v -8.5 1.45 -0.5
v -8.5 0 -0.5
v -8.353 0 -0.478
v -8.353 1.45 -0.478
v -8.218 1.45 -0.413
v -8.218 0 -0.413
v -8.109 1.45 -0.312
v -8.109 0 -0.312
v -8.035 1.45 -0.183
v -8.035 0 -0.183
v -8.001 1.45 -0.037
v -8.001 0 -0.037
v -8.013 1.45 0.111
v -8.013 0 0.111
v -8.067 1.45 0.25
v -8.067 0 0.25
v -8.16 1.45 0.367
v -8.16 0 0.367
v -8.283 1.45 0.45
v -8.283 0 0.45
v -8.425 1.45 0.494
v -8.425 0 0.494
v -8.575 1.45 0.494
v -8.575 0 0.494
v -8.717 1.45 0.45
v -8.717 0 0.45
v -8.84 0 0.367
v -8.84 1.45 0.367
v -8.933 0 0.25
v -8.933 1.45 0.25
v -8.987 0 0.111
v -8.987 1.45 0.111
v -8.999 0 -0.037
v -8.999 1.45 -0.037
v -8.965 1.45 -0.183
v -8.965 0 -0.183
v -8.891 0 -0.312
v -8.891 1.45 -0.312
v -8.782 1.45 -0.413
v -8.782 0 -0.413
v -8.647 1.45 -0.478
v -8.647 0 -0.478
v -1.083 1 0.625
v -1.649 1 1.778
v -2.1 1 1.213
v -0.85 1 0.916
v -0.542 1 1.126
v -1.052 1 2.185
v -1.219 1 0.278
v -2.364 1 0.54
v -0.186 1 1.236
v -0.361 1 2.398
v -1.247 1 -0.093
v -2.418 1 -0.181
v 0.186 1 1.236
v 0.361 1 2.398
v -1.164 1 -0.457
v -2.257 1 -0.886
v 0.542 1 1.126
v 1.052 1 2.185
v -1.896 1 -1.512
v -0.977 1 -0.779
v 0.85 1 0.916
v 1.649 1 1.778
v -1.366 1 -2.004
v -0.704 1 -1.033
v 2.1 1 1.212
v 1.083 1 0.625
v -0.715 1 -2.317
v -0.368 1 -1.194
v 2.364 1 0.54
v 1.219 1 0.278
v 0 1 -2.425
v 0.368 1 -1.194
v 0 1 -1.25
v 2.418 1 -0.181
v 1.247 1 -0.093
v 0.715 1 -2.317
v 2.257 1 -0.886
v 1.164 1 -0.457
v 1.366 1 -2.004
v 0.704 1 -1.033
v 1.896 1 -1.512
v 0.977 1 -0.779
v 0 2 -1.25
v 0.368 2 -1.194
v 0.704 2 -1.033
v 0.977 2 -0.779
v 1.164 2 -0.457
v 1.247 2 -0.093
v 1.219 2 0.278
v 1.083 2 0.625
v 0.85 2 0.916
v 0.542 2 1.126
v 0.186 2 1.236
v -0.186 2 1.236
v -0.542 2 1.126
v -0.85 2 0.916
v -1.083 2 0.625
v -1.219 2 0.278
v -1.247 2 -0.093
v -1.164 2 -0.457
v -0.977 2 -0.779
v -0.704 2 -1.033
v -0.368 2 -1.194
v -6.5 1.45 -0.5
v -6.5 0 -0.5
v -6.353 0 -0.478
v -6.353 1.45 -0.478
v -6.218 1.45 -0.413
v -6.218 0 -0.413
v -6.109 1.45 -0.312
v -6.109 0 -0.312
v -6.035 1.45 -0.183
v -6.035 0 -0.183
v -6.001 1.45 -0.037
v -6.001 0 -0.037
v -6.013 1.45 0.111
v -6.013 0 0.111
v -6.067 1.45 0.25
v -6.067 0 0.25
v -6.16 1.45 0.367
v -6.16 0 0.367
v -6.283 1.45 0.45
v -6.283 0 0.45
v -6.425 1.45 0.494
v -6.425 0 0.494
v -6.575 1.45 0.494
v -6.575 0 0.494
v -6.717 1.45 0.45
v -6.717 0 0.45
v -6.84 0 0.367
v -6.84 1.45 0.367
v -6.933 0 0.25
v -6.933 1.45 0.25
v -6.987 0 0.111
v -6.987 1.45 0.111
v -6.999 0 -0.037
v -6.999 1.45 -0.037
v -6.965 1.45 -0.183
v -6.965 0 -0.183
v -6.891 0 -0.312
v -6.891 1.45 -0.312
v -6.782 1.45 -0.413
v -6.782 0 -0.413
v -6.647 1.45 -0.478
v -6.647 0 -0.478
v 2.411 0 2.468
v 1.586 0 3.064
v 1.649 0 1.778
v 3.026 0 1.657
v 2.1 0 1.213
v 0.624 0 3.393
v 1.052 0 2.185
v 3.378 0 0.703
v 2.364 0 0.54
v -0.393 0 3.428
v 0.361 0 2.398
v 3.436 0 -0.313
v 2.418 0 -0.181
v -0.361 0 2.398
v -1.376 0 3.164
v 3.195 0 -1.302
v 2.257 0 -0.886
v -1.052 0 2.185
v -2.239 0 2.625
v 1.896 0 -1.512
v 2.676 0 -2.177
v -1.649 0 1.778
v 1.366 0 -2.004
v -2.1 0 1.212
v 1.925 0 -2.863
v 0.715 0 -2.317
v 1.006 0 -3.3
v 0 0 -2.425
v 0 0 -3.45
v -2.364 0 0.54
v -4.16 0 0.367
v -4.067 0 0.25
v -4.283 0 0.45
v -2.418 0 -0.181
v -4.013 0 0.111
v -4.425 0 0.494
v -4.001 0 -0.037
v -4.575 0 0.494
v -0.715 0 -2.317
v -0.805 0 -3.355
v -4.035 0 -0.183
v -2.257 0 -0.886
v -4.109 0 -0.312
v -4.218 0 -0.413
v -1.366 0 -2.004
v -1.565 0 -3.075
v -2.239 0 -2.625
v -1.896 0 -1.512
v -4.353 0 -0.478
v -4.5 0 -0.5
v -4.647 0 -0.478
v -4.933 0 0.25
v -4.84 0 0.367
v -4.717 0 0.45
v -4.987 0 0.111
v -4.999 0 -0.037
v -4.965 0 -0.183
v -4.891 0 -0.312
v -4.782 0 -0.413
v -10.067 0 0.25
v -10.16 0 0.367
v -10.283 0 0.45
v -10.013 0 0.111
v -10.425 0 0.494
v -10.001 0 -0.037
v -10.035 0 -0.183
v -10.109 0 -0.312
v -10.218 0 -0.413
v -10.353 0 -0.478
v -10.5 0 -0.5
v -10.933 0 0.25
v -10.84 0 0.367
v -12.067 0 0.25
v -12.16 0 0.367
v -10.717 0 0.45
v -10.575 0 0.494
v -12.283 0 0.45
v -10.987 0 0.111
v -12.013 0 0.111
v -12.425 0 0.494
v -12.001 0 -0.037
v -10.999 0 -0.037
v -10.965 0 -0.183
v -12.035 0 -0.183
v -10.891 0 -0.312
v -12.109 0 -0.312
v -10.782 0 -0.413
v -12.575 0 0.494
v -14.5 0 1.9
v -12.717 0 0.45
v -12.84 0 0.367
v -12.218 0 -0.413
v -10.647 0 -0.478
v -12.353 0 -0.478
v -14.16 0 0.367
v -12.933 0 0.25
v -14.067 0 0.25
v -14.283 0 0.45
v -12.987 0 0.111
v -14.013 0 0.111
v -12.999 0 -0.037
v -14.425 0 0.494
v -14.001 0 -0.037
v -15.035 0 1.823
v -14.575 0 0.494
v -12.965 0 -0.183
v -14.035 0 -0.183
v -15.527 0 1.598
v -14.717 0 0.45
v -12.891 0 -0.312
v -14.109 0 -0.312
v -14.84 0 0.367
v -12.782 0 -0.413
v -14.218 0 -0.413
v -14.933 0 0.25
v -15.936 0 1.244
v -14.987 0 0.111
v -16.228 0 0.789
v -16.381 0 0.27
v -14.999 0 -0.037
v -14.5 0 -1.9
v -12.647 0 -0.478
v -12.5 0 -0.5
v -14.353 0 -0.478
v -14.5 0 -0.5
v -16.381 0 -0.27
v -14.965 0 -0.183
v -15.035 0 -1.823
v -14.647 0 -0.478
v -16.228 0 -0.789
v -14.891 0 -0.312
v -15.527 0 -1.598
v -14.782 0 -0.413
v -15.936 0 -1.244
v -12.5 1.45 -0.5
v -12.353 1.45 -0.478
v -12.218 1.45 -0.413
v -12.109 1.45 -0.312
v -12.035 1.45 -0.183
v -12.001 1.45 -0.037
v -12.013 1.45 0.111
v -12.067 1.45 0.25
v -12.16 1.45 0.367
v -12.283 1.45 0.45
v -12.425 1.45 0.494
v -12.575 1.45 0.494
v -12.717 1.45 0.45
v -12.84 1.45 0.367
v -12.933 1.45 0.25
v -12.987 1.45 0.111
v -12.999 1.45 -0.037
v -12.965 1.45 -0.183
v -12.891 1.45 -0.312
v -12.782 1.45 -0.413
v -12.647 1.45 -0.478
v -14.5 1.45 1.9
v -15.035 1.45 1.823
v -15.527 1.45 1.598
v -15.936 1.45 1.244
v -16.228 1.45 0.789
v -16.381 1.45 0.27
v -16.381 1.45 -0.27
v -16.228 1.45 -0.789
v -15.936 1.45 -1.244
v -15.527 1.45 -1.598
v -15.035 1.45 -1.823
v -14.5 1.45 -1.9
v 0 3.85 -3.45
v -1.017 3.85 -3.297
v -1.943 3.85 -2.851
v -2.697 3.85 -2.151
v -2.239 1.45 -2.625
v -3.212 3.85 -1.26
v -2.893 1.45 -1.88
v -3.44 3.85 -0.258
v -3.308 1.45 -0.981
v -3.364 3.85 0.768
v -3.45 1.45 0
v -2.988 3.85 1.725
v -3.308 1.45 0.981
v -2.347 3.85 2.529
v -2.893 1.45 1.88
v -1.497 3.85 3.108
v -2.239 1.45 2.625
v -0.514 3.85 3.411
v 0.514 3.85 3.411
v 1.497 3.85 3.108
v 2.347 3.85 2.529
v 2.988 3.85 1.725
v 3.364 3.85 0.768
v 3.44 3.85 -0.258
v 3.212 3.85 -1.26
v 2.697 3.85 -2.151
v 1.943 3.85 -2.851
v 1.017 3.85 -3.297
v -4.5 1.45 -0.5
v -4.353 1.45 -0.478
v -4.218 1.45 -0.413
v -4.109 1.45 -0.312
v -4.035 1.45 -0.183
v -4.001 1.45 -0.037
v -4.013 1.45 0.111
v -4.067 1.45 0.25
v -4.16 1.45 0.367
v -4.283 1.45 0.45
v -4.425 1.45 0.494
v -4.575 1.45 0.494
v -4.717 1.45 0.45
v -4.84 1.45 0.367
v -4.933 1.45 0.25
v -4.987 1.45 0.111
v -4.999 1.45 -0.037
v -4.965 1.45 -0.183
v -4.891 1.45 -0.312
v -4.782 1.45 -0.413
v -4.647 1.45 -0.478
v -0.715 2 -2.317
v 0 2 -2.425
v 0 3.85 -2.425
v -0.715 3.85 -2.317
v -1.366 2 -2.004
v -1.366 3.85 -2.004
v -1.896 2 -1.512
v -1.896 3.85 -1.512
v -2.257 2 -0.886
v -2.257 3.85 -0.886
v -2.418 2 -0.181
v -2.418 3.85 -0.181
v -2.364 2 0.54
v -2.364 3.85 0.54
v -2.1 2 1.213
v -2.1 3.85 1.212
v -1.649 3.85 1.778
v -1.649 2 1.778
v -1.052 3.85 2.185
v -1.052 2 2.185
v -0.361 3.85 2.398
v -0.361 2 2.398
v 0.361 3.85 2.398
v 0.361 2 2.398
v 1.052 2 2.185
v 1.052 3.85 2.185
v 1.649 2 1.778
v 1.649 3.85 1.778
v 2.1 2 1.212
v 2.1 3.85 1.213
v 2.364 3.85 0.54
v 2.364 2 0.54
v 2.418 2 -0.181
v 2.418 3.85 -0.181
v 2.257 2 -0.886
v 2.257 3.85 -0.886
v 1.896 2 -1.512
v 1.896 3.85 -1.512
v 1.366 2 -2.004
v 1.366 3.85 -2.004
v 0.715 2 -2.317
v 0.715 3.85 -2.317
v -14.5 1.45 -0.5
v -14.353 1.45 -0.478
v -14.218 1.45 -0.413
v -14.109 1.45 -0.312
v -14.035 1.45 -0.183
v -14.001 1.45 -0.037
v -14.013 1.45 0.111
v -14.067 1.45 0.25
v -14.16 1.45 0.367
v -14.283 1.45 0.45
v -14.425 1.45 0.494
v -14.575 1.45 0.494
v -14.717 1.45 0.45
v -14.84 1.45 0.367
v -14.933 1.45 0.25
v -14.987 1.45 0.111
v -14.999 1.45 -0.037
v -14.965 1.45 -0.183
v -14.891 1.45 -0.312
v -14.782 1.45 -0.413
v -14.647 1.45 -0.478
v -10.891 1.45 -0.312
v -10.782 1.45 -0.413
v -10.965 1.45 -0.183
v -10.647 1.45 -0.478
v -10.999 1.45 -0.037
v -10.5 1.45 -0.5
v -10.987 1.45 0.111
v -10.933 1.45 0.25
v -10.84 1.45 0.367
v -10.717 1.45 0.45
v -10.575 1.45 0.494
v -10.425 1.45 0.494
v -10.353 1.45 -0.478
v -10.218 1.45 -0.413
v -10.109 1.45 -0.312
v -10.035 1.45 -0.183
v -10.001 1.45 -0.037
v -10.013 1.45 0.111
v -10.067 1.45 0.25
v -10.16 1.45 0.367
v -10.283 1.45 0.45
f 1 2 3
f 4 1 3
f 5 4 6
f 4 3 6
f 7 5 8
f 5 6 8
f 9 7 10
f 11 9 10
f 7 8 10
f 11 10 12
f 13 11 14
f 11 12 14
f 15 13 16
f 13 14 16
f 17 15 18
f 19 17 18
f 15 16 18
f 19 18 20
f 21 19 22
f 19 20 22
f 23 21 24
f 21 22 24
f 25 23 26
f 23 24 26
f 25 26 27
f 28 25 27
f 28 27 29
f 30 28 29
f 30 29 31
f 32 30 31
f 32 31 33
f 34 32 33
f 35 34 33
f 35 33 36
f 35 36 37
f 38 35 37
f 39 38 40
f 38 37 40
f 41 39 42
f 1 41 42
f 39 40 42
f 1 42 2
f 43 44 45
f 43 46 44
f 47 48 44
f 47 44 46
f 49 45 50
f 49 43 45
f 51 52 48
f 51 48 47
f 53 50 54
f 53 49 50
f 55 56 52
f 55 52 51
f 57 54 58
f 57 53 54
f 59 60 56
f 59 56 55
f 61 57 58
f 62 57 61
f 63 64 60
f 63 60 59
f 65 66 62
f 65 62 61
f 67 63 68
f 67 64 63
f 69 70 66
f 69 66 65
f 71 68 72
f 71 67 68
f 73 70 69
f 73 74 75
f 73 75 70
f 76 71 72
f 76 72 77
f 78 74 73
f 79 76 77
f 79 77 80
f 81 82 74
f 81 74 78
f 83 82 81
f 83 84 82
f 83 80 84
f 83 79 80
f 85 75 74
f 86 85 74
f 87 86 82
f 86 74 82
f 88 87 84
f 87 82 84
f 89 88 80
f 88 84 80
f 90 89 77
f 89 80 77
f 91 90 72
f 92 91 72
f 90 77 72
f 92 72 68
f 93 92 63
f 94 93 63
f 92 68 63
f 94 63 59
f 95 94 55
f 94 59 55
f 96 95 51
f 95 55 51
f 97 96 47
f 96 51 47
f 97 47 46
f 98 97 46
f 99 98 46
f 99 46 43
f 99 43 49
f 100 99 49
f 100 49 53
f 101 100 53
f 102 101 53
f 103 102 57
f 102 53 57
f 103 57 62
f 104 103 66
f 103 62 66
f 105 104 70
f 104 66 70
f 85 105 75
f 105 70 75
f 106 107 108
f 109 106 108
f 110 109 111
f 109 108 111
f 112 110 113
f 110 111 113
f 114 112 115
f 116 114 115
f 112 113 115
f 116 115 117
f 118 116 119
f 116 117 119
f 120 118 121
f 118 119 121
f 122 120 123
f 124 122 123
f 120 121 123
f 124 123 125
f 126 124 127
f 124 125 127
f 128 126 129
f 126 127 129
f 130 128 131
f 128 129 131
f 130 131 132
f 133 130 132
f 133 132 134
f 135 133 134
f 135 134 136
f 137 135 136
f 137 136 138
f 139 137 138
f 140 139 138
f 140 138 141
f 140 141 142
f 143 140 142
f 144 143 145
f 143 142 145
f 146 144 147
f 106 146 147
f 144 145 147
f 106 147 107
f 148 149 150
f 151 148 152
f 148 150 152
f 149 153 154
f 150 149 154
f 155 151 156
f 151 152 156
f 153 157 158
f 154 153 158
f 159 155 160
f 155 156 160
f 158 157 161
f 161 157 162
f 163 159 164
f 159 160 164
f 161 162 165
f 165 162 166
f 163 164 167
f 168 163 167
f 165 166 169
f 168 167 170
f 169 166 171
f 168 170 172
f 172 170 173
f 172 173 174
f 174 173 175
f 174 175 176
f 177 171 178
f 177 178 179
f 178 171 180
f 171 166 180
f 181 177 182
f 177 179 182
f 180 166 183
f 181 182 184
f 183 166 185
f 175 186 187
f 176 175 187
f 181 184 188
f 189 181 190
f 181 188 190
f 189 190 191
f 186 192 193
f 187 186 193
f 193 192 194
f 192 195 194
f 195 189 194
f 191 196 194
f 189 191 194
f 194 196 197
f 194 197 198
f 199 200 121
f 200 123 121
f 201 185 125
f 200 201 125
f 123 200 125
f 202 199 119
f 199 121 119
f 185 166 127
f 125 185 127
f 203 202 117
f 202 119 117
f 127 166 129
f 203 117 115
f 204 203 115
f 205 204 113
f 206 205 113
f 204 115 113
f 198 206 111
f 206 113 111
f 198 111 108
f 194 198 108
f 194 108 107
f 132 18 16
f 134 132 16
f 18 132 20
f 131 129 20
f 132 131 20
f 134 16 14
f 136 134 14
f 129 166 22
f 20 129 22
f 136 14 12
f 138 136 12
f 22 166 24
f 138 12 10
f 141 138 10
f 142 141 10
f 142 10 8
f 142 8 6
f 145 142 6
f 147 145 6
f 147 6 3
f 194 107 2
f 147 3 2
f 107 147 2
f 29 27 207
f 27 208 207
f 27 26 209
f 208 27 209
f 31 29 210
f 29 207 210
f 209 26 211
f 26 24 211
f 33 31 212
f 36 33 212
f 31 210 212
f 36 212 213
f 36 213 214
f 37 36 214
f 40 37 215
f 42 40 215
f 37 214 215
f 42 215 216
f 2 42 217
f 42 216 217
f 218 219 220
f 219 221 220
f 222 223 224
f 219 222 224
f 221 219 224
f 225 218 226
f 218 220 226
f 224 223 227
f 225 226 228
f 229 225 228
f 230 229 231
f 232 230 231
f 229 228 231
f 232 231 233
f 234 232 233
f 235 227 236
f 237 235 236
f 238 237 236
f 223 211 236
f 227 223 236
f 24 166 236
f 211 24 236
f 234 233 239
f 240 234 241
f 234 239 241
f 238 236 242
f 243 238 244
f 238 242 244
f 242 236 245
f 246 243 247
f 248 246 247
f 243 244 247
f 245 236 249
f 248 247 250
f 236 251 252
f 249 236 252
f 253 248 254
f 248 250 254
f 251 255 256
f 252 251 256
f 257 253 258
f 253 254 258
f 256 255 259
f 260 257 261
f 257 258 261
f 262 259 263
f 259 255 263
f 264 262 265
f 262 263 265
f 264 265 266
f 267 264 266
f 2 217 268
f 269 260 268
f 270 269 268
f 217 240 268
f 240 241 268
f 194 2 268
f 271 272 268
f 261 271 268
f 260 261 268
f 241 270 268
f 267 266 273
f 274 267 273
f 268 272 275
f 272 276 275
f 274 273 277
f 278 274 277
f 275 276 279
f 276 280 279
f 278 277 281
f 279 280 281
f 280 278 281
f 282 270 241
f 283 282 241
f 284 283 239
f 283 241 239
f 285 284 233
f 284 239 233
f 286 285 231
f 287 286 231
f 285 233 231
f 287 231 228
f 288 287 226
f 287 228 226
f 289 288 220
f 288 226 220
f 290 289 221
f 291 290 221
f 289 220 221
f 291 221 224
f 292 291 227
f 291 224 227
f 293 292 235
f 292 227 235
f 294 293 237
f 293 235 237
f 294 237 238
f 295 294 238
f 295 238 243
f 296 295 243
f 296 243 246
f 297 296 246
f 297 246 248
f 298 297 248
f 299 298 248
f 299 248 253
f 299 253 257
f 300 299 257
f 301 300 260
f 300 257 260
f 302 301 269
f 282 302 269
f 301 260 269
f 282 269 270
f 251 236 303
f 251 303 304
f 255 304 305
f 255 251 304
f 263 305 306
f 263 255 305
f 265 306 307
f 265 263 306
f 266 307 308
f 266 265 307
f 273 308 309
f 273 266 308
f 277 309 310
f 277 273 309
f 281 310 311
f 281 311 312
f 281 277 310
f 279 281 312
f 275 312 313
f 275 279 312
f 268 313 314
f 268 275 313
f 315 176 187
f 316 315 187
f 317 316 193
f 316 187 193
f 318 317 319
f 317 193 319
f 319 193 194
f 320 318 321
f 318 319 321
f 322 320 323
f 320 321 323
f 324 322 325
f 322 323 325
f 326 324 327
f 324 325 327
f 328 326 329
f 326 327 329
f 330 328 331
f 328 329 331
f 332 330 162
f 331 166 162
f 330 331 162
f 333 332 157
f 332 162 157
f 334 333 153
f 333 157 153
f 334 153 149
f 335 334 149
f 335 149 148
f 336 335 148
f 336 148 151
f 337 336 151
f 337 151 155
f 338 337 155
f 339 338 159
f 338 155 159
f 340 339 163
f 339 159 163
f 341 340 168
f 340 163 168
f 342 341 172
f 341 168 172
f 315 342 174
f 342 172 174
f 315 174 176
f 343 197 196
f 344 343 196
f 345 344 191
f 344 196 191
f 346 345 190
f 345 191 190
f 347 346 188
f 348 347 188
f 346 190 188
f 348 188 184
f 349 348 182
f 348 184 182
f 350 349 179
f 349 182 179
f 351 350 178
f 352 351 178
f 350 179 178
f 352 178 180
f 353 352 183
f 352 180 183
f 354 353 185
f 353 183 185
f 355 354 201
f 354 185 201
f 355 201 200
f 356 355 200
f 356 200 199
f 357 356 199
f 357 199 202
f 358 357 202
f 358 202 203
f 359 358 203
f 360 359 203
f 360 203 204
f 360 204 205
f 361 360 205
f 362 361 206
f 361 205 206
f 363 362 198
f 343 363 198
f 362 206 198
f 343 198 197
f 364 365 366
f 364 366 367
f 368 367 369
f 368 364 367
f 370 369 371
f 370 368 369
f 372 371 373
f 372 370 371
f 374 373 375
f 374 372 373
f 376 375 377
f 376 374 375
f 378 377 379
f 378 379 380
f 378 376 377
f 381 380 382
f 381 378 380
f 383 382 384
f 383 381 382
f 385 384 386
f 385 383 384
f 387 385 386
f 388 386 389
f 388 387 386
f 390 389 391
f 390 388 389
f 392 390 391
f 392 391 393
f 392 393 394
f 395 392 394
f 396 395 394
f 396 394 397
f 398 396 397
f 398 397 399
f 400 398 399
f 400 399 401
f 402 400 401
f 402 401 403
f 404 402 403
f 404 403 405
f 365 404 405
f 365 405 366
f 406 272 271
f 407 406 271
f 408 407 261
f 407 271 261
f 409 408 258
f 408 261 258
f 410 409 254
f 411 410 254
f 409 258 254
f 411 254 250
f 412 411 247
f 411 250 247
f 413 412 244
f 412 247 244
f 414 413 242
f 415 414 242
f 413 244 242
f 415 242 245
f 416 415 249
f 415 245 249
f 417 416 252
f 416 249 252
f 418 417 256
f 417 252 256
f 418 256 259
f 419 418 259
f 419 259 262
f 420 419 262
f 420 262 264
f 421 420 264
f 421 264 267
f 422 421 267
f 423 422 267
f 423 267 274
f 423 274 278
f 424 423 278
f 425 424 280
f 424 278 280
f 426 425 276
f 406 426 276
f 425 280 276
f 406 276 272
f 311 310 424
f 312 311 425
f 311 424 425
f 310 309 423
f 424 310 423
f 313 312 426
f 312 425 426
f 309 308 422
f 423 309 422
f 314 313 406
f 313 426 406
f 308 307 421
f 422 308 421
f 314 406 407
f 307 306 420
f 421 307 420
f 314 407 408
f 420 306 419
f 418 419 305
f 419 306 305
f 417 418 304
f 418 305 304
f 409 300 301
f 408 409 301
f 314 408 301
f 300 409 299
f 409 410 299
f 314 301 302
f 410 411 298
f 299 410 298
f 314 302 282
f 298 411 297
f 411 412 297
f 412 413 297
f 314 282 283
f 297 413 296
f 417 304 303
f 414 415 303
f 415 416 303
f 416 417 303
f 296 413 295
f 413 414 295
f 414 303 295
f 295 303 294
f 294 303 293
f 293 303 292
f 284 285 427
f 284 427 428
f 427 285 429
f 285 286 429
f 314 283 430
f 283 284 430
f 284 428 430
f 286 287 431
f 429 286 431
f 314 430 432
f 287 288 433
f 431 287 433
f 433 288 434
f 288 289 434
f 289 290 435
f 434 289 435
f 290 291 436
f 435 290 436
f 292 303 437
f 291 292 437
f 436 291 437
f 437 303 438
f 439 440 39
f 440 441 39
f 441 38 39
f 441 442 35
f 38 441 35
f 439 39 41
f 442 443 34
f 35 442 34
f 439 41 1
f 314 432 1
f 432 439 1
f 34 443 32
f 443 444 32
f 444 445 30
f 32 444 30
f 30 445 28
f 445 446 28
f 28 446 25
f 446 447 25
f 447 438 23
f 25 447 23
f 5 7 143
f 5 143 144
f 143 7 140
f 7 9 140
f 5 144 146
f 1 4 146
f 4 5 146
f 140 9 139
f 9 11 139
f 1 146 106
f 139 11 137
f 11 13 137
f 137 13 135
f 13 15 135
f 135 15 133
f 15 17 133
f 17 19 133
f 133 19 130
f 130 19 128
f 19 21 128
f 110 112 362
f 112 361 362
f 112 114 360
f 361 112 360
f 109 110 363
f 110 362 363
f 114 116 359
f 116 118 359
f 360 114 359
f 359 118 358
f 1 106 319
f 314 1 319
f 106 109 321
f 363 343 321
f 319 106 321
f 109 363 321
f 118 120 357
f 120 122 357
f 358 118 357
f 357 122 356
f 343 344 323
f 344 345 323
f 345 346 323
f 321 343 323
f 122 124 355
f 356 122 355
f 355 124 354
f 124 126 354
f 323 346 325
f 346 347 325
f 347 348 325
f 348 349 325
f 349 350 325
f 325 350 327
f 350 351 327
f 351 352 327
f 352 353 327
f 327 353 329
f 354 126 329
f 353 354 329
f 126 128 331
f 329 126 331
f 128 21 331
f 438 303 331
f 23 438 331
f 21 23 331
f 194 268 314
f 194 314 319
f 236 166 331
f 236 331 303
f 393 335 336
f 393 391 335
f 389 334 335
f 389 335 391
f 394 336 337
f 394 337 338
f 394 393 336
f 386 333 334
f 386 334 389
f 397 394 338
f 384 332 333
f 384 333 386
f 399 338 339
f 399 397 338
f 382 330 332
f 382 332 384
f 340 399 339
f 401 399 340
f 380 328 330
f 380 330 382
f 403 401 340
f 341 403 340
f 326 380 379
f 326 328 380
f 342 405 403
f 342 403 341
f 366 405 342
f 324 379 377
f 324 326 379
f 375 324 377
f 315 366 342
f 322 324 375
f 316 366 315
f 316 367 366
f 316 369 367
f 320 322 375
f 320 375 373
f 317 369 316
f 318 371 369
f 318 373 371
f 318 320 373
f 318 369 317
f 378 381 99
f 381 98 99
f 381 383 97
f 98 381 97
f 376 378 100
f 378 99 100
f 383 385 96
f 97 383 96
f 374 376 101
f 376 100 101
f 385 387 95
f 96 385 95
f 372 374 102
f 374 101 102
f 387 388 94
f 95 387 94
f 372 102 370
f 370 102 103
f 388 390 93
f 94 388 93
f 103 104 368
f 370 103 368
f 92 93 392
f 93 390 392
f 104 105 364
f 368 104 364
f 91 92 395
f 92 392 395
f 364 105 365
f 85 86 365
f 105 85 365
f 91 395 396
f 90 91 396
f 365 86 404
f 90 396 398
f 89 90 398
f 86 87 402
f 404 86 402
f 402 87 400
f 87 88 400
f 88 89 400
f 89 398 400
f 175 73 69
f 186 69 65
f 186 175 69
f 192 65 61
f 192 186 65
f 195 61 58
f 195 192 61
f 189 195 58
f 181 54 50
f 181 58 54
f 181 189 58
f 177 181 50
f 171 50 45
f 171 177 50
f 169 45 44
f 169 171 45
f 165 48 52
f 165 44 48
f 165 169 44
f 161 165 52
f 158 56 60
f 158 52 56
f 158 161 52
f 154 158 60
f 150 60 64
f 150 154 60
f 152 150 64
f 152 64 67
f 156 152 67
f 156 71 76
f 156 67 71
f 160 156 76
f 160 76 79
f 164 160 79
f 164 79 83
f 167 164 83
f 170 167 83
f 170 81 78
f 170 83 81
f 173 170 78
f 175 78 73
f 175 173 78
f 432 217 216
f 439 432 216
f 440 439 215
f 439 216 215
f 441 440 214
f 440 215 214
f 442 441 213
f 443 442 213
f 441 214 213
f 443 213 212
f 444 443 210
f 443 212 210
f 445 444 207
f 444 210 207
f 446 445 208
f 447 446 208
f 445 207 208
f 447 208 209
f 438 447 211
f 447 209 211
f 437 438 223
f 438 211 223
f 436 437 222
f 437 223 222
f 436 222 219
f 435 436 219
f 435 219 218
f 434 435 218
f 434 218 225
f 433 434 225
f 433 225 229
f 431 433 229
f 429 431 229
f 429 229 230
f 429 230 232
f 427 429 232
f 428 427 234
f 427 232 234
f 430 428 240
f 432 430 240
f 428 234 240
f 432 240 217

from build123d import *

# Parameters (mm, degrees)
SKETCH_1_R      = 3.45
SKETCH_1_R_2    = 2.425
EXTRUDE_1_DEPTH = 3.85
SKETCH_2_R      = 2.425
SKETCH_2_R_2    = 1.25
EXTRUDE_2_DEPTH = 1
SKETCH_3_R      = 0.5
EXTRUDE_3_DEPTH = 1.45


with BuildPart() as part:
    # 草图1 → 凸台-拉伸1 (new body)
    with BuildSketch(Plane(origin=(0, 0, 0), x_dir=(1, 0, 0), z_dir=(0, 1, 0))):
        with Locations(Location((0, 0, 0), (0, 0, 90))):
            Circle(SKETCH_1_R)
        with Locations(Location((0, 0, 0), (0, 0, 90))):
            Circle(SKETCH_1_R_2, mode=Mode.SUBTRACT)
    extrude(amount=EXTRUDE_1_DEPTH)

    # 草图2 → 凸台-拉伸2 (add)
    with BuildSketch(Plane(origin=(0, 1, 0), x_dir=(-1, 0, 0), z_dir=(0, -1, 0))):
        with Locations(Location((0, 0, 0), (0, 0, 90))):
            Circle(SKETCH_2_R)
        with Locations(Location((0, 0, 0), (0, 0, 90))):
            Circle(SKETCH_2_R_2, mode=Mode.SUBTRACT)
    extrude(amount=-EXTRUDE_2_DEPTH)

    # 草图3 → 凸台-拉伸3 (add)
    with BuildSketch(Plane.XZ):
        with BuildLine():
            Line((-14.5, -1.9), (-2.238721733, -2.625))
            ThreePointArc((-2.238721733, -2.625), (-3.45, 0), (-2.238721733, 2.625))
            Line((-2.238721733, 2.625), (-14.5, 1.9))
            ThreePointArc((-14.5, 1.9), (-16.4, 0), (-14.5, -1.9))
        make_face()
        with Locations(Location((-14.5, 0, 0), (0, 0, 270))):
            Circle(SKETCH_3_R, mode=Mode.SUBTRACT)
        with Locations(Location((-12.5, 0, 0), (0, 0, 270))):
            Circle(SKETCH_3_R, mode=Mode.SUBTRACT)
        with Locations(Location((-10.5, 0, 0), (0, 0, 270))):
            Circle(SKETCH_3_R, mode=Mode.SUBTRACT)
        with Locations(Location((-8.5, 0, 0), (0, 0, 270))):
            Circle(SKETCH_3_R, mode=Mode.SUBTRACT)
        with Locations(Location((-6.5, 0, 0), (0, 0, 270))):
            Circle(SKETCH_3_R, mode=Mode.SUBTRACT)
        with Locations(Location((-4.5, 0, 0), (0, 0, 270))):
            Circle(SKETCH_3_R, mode=Mode.SUBTRACT)
    extrude(amount=-EXTRUDE_3_DEPTH)


solid = part.part
